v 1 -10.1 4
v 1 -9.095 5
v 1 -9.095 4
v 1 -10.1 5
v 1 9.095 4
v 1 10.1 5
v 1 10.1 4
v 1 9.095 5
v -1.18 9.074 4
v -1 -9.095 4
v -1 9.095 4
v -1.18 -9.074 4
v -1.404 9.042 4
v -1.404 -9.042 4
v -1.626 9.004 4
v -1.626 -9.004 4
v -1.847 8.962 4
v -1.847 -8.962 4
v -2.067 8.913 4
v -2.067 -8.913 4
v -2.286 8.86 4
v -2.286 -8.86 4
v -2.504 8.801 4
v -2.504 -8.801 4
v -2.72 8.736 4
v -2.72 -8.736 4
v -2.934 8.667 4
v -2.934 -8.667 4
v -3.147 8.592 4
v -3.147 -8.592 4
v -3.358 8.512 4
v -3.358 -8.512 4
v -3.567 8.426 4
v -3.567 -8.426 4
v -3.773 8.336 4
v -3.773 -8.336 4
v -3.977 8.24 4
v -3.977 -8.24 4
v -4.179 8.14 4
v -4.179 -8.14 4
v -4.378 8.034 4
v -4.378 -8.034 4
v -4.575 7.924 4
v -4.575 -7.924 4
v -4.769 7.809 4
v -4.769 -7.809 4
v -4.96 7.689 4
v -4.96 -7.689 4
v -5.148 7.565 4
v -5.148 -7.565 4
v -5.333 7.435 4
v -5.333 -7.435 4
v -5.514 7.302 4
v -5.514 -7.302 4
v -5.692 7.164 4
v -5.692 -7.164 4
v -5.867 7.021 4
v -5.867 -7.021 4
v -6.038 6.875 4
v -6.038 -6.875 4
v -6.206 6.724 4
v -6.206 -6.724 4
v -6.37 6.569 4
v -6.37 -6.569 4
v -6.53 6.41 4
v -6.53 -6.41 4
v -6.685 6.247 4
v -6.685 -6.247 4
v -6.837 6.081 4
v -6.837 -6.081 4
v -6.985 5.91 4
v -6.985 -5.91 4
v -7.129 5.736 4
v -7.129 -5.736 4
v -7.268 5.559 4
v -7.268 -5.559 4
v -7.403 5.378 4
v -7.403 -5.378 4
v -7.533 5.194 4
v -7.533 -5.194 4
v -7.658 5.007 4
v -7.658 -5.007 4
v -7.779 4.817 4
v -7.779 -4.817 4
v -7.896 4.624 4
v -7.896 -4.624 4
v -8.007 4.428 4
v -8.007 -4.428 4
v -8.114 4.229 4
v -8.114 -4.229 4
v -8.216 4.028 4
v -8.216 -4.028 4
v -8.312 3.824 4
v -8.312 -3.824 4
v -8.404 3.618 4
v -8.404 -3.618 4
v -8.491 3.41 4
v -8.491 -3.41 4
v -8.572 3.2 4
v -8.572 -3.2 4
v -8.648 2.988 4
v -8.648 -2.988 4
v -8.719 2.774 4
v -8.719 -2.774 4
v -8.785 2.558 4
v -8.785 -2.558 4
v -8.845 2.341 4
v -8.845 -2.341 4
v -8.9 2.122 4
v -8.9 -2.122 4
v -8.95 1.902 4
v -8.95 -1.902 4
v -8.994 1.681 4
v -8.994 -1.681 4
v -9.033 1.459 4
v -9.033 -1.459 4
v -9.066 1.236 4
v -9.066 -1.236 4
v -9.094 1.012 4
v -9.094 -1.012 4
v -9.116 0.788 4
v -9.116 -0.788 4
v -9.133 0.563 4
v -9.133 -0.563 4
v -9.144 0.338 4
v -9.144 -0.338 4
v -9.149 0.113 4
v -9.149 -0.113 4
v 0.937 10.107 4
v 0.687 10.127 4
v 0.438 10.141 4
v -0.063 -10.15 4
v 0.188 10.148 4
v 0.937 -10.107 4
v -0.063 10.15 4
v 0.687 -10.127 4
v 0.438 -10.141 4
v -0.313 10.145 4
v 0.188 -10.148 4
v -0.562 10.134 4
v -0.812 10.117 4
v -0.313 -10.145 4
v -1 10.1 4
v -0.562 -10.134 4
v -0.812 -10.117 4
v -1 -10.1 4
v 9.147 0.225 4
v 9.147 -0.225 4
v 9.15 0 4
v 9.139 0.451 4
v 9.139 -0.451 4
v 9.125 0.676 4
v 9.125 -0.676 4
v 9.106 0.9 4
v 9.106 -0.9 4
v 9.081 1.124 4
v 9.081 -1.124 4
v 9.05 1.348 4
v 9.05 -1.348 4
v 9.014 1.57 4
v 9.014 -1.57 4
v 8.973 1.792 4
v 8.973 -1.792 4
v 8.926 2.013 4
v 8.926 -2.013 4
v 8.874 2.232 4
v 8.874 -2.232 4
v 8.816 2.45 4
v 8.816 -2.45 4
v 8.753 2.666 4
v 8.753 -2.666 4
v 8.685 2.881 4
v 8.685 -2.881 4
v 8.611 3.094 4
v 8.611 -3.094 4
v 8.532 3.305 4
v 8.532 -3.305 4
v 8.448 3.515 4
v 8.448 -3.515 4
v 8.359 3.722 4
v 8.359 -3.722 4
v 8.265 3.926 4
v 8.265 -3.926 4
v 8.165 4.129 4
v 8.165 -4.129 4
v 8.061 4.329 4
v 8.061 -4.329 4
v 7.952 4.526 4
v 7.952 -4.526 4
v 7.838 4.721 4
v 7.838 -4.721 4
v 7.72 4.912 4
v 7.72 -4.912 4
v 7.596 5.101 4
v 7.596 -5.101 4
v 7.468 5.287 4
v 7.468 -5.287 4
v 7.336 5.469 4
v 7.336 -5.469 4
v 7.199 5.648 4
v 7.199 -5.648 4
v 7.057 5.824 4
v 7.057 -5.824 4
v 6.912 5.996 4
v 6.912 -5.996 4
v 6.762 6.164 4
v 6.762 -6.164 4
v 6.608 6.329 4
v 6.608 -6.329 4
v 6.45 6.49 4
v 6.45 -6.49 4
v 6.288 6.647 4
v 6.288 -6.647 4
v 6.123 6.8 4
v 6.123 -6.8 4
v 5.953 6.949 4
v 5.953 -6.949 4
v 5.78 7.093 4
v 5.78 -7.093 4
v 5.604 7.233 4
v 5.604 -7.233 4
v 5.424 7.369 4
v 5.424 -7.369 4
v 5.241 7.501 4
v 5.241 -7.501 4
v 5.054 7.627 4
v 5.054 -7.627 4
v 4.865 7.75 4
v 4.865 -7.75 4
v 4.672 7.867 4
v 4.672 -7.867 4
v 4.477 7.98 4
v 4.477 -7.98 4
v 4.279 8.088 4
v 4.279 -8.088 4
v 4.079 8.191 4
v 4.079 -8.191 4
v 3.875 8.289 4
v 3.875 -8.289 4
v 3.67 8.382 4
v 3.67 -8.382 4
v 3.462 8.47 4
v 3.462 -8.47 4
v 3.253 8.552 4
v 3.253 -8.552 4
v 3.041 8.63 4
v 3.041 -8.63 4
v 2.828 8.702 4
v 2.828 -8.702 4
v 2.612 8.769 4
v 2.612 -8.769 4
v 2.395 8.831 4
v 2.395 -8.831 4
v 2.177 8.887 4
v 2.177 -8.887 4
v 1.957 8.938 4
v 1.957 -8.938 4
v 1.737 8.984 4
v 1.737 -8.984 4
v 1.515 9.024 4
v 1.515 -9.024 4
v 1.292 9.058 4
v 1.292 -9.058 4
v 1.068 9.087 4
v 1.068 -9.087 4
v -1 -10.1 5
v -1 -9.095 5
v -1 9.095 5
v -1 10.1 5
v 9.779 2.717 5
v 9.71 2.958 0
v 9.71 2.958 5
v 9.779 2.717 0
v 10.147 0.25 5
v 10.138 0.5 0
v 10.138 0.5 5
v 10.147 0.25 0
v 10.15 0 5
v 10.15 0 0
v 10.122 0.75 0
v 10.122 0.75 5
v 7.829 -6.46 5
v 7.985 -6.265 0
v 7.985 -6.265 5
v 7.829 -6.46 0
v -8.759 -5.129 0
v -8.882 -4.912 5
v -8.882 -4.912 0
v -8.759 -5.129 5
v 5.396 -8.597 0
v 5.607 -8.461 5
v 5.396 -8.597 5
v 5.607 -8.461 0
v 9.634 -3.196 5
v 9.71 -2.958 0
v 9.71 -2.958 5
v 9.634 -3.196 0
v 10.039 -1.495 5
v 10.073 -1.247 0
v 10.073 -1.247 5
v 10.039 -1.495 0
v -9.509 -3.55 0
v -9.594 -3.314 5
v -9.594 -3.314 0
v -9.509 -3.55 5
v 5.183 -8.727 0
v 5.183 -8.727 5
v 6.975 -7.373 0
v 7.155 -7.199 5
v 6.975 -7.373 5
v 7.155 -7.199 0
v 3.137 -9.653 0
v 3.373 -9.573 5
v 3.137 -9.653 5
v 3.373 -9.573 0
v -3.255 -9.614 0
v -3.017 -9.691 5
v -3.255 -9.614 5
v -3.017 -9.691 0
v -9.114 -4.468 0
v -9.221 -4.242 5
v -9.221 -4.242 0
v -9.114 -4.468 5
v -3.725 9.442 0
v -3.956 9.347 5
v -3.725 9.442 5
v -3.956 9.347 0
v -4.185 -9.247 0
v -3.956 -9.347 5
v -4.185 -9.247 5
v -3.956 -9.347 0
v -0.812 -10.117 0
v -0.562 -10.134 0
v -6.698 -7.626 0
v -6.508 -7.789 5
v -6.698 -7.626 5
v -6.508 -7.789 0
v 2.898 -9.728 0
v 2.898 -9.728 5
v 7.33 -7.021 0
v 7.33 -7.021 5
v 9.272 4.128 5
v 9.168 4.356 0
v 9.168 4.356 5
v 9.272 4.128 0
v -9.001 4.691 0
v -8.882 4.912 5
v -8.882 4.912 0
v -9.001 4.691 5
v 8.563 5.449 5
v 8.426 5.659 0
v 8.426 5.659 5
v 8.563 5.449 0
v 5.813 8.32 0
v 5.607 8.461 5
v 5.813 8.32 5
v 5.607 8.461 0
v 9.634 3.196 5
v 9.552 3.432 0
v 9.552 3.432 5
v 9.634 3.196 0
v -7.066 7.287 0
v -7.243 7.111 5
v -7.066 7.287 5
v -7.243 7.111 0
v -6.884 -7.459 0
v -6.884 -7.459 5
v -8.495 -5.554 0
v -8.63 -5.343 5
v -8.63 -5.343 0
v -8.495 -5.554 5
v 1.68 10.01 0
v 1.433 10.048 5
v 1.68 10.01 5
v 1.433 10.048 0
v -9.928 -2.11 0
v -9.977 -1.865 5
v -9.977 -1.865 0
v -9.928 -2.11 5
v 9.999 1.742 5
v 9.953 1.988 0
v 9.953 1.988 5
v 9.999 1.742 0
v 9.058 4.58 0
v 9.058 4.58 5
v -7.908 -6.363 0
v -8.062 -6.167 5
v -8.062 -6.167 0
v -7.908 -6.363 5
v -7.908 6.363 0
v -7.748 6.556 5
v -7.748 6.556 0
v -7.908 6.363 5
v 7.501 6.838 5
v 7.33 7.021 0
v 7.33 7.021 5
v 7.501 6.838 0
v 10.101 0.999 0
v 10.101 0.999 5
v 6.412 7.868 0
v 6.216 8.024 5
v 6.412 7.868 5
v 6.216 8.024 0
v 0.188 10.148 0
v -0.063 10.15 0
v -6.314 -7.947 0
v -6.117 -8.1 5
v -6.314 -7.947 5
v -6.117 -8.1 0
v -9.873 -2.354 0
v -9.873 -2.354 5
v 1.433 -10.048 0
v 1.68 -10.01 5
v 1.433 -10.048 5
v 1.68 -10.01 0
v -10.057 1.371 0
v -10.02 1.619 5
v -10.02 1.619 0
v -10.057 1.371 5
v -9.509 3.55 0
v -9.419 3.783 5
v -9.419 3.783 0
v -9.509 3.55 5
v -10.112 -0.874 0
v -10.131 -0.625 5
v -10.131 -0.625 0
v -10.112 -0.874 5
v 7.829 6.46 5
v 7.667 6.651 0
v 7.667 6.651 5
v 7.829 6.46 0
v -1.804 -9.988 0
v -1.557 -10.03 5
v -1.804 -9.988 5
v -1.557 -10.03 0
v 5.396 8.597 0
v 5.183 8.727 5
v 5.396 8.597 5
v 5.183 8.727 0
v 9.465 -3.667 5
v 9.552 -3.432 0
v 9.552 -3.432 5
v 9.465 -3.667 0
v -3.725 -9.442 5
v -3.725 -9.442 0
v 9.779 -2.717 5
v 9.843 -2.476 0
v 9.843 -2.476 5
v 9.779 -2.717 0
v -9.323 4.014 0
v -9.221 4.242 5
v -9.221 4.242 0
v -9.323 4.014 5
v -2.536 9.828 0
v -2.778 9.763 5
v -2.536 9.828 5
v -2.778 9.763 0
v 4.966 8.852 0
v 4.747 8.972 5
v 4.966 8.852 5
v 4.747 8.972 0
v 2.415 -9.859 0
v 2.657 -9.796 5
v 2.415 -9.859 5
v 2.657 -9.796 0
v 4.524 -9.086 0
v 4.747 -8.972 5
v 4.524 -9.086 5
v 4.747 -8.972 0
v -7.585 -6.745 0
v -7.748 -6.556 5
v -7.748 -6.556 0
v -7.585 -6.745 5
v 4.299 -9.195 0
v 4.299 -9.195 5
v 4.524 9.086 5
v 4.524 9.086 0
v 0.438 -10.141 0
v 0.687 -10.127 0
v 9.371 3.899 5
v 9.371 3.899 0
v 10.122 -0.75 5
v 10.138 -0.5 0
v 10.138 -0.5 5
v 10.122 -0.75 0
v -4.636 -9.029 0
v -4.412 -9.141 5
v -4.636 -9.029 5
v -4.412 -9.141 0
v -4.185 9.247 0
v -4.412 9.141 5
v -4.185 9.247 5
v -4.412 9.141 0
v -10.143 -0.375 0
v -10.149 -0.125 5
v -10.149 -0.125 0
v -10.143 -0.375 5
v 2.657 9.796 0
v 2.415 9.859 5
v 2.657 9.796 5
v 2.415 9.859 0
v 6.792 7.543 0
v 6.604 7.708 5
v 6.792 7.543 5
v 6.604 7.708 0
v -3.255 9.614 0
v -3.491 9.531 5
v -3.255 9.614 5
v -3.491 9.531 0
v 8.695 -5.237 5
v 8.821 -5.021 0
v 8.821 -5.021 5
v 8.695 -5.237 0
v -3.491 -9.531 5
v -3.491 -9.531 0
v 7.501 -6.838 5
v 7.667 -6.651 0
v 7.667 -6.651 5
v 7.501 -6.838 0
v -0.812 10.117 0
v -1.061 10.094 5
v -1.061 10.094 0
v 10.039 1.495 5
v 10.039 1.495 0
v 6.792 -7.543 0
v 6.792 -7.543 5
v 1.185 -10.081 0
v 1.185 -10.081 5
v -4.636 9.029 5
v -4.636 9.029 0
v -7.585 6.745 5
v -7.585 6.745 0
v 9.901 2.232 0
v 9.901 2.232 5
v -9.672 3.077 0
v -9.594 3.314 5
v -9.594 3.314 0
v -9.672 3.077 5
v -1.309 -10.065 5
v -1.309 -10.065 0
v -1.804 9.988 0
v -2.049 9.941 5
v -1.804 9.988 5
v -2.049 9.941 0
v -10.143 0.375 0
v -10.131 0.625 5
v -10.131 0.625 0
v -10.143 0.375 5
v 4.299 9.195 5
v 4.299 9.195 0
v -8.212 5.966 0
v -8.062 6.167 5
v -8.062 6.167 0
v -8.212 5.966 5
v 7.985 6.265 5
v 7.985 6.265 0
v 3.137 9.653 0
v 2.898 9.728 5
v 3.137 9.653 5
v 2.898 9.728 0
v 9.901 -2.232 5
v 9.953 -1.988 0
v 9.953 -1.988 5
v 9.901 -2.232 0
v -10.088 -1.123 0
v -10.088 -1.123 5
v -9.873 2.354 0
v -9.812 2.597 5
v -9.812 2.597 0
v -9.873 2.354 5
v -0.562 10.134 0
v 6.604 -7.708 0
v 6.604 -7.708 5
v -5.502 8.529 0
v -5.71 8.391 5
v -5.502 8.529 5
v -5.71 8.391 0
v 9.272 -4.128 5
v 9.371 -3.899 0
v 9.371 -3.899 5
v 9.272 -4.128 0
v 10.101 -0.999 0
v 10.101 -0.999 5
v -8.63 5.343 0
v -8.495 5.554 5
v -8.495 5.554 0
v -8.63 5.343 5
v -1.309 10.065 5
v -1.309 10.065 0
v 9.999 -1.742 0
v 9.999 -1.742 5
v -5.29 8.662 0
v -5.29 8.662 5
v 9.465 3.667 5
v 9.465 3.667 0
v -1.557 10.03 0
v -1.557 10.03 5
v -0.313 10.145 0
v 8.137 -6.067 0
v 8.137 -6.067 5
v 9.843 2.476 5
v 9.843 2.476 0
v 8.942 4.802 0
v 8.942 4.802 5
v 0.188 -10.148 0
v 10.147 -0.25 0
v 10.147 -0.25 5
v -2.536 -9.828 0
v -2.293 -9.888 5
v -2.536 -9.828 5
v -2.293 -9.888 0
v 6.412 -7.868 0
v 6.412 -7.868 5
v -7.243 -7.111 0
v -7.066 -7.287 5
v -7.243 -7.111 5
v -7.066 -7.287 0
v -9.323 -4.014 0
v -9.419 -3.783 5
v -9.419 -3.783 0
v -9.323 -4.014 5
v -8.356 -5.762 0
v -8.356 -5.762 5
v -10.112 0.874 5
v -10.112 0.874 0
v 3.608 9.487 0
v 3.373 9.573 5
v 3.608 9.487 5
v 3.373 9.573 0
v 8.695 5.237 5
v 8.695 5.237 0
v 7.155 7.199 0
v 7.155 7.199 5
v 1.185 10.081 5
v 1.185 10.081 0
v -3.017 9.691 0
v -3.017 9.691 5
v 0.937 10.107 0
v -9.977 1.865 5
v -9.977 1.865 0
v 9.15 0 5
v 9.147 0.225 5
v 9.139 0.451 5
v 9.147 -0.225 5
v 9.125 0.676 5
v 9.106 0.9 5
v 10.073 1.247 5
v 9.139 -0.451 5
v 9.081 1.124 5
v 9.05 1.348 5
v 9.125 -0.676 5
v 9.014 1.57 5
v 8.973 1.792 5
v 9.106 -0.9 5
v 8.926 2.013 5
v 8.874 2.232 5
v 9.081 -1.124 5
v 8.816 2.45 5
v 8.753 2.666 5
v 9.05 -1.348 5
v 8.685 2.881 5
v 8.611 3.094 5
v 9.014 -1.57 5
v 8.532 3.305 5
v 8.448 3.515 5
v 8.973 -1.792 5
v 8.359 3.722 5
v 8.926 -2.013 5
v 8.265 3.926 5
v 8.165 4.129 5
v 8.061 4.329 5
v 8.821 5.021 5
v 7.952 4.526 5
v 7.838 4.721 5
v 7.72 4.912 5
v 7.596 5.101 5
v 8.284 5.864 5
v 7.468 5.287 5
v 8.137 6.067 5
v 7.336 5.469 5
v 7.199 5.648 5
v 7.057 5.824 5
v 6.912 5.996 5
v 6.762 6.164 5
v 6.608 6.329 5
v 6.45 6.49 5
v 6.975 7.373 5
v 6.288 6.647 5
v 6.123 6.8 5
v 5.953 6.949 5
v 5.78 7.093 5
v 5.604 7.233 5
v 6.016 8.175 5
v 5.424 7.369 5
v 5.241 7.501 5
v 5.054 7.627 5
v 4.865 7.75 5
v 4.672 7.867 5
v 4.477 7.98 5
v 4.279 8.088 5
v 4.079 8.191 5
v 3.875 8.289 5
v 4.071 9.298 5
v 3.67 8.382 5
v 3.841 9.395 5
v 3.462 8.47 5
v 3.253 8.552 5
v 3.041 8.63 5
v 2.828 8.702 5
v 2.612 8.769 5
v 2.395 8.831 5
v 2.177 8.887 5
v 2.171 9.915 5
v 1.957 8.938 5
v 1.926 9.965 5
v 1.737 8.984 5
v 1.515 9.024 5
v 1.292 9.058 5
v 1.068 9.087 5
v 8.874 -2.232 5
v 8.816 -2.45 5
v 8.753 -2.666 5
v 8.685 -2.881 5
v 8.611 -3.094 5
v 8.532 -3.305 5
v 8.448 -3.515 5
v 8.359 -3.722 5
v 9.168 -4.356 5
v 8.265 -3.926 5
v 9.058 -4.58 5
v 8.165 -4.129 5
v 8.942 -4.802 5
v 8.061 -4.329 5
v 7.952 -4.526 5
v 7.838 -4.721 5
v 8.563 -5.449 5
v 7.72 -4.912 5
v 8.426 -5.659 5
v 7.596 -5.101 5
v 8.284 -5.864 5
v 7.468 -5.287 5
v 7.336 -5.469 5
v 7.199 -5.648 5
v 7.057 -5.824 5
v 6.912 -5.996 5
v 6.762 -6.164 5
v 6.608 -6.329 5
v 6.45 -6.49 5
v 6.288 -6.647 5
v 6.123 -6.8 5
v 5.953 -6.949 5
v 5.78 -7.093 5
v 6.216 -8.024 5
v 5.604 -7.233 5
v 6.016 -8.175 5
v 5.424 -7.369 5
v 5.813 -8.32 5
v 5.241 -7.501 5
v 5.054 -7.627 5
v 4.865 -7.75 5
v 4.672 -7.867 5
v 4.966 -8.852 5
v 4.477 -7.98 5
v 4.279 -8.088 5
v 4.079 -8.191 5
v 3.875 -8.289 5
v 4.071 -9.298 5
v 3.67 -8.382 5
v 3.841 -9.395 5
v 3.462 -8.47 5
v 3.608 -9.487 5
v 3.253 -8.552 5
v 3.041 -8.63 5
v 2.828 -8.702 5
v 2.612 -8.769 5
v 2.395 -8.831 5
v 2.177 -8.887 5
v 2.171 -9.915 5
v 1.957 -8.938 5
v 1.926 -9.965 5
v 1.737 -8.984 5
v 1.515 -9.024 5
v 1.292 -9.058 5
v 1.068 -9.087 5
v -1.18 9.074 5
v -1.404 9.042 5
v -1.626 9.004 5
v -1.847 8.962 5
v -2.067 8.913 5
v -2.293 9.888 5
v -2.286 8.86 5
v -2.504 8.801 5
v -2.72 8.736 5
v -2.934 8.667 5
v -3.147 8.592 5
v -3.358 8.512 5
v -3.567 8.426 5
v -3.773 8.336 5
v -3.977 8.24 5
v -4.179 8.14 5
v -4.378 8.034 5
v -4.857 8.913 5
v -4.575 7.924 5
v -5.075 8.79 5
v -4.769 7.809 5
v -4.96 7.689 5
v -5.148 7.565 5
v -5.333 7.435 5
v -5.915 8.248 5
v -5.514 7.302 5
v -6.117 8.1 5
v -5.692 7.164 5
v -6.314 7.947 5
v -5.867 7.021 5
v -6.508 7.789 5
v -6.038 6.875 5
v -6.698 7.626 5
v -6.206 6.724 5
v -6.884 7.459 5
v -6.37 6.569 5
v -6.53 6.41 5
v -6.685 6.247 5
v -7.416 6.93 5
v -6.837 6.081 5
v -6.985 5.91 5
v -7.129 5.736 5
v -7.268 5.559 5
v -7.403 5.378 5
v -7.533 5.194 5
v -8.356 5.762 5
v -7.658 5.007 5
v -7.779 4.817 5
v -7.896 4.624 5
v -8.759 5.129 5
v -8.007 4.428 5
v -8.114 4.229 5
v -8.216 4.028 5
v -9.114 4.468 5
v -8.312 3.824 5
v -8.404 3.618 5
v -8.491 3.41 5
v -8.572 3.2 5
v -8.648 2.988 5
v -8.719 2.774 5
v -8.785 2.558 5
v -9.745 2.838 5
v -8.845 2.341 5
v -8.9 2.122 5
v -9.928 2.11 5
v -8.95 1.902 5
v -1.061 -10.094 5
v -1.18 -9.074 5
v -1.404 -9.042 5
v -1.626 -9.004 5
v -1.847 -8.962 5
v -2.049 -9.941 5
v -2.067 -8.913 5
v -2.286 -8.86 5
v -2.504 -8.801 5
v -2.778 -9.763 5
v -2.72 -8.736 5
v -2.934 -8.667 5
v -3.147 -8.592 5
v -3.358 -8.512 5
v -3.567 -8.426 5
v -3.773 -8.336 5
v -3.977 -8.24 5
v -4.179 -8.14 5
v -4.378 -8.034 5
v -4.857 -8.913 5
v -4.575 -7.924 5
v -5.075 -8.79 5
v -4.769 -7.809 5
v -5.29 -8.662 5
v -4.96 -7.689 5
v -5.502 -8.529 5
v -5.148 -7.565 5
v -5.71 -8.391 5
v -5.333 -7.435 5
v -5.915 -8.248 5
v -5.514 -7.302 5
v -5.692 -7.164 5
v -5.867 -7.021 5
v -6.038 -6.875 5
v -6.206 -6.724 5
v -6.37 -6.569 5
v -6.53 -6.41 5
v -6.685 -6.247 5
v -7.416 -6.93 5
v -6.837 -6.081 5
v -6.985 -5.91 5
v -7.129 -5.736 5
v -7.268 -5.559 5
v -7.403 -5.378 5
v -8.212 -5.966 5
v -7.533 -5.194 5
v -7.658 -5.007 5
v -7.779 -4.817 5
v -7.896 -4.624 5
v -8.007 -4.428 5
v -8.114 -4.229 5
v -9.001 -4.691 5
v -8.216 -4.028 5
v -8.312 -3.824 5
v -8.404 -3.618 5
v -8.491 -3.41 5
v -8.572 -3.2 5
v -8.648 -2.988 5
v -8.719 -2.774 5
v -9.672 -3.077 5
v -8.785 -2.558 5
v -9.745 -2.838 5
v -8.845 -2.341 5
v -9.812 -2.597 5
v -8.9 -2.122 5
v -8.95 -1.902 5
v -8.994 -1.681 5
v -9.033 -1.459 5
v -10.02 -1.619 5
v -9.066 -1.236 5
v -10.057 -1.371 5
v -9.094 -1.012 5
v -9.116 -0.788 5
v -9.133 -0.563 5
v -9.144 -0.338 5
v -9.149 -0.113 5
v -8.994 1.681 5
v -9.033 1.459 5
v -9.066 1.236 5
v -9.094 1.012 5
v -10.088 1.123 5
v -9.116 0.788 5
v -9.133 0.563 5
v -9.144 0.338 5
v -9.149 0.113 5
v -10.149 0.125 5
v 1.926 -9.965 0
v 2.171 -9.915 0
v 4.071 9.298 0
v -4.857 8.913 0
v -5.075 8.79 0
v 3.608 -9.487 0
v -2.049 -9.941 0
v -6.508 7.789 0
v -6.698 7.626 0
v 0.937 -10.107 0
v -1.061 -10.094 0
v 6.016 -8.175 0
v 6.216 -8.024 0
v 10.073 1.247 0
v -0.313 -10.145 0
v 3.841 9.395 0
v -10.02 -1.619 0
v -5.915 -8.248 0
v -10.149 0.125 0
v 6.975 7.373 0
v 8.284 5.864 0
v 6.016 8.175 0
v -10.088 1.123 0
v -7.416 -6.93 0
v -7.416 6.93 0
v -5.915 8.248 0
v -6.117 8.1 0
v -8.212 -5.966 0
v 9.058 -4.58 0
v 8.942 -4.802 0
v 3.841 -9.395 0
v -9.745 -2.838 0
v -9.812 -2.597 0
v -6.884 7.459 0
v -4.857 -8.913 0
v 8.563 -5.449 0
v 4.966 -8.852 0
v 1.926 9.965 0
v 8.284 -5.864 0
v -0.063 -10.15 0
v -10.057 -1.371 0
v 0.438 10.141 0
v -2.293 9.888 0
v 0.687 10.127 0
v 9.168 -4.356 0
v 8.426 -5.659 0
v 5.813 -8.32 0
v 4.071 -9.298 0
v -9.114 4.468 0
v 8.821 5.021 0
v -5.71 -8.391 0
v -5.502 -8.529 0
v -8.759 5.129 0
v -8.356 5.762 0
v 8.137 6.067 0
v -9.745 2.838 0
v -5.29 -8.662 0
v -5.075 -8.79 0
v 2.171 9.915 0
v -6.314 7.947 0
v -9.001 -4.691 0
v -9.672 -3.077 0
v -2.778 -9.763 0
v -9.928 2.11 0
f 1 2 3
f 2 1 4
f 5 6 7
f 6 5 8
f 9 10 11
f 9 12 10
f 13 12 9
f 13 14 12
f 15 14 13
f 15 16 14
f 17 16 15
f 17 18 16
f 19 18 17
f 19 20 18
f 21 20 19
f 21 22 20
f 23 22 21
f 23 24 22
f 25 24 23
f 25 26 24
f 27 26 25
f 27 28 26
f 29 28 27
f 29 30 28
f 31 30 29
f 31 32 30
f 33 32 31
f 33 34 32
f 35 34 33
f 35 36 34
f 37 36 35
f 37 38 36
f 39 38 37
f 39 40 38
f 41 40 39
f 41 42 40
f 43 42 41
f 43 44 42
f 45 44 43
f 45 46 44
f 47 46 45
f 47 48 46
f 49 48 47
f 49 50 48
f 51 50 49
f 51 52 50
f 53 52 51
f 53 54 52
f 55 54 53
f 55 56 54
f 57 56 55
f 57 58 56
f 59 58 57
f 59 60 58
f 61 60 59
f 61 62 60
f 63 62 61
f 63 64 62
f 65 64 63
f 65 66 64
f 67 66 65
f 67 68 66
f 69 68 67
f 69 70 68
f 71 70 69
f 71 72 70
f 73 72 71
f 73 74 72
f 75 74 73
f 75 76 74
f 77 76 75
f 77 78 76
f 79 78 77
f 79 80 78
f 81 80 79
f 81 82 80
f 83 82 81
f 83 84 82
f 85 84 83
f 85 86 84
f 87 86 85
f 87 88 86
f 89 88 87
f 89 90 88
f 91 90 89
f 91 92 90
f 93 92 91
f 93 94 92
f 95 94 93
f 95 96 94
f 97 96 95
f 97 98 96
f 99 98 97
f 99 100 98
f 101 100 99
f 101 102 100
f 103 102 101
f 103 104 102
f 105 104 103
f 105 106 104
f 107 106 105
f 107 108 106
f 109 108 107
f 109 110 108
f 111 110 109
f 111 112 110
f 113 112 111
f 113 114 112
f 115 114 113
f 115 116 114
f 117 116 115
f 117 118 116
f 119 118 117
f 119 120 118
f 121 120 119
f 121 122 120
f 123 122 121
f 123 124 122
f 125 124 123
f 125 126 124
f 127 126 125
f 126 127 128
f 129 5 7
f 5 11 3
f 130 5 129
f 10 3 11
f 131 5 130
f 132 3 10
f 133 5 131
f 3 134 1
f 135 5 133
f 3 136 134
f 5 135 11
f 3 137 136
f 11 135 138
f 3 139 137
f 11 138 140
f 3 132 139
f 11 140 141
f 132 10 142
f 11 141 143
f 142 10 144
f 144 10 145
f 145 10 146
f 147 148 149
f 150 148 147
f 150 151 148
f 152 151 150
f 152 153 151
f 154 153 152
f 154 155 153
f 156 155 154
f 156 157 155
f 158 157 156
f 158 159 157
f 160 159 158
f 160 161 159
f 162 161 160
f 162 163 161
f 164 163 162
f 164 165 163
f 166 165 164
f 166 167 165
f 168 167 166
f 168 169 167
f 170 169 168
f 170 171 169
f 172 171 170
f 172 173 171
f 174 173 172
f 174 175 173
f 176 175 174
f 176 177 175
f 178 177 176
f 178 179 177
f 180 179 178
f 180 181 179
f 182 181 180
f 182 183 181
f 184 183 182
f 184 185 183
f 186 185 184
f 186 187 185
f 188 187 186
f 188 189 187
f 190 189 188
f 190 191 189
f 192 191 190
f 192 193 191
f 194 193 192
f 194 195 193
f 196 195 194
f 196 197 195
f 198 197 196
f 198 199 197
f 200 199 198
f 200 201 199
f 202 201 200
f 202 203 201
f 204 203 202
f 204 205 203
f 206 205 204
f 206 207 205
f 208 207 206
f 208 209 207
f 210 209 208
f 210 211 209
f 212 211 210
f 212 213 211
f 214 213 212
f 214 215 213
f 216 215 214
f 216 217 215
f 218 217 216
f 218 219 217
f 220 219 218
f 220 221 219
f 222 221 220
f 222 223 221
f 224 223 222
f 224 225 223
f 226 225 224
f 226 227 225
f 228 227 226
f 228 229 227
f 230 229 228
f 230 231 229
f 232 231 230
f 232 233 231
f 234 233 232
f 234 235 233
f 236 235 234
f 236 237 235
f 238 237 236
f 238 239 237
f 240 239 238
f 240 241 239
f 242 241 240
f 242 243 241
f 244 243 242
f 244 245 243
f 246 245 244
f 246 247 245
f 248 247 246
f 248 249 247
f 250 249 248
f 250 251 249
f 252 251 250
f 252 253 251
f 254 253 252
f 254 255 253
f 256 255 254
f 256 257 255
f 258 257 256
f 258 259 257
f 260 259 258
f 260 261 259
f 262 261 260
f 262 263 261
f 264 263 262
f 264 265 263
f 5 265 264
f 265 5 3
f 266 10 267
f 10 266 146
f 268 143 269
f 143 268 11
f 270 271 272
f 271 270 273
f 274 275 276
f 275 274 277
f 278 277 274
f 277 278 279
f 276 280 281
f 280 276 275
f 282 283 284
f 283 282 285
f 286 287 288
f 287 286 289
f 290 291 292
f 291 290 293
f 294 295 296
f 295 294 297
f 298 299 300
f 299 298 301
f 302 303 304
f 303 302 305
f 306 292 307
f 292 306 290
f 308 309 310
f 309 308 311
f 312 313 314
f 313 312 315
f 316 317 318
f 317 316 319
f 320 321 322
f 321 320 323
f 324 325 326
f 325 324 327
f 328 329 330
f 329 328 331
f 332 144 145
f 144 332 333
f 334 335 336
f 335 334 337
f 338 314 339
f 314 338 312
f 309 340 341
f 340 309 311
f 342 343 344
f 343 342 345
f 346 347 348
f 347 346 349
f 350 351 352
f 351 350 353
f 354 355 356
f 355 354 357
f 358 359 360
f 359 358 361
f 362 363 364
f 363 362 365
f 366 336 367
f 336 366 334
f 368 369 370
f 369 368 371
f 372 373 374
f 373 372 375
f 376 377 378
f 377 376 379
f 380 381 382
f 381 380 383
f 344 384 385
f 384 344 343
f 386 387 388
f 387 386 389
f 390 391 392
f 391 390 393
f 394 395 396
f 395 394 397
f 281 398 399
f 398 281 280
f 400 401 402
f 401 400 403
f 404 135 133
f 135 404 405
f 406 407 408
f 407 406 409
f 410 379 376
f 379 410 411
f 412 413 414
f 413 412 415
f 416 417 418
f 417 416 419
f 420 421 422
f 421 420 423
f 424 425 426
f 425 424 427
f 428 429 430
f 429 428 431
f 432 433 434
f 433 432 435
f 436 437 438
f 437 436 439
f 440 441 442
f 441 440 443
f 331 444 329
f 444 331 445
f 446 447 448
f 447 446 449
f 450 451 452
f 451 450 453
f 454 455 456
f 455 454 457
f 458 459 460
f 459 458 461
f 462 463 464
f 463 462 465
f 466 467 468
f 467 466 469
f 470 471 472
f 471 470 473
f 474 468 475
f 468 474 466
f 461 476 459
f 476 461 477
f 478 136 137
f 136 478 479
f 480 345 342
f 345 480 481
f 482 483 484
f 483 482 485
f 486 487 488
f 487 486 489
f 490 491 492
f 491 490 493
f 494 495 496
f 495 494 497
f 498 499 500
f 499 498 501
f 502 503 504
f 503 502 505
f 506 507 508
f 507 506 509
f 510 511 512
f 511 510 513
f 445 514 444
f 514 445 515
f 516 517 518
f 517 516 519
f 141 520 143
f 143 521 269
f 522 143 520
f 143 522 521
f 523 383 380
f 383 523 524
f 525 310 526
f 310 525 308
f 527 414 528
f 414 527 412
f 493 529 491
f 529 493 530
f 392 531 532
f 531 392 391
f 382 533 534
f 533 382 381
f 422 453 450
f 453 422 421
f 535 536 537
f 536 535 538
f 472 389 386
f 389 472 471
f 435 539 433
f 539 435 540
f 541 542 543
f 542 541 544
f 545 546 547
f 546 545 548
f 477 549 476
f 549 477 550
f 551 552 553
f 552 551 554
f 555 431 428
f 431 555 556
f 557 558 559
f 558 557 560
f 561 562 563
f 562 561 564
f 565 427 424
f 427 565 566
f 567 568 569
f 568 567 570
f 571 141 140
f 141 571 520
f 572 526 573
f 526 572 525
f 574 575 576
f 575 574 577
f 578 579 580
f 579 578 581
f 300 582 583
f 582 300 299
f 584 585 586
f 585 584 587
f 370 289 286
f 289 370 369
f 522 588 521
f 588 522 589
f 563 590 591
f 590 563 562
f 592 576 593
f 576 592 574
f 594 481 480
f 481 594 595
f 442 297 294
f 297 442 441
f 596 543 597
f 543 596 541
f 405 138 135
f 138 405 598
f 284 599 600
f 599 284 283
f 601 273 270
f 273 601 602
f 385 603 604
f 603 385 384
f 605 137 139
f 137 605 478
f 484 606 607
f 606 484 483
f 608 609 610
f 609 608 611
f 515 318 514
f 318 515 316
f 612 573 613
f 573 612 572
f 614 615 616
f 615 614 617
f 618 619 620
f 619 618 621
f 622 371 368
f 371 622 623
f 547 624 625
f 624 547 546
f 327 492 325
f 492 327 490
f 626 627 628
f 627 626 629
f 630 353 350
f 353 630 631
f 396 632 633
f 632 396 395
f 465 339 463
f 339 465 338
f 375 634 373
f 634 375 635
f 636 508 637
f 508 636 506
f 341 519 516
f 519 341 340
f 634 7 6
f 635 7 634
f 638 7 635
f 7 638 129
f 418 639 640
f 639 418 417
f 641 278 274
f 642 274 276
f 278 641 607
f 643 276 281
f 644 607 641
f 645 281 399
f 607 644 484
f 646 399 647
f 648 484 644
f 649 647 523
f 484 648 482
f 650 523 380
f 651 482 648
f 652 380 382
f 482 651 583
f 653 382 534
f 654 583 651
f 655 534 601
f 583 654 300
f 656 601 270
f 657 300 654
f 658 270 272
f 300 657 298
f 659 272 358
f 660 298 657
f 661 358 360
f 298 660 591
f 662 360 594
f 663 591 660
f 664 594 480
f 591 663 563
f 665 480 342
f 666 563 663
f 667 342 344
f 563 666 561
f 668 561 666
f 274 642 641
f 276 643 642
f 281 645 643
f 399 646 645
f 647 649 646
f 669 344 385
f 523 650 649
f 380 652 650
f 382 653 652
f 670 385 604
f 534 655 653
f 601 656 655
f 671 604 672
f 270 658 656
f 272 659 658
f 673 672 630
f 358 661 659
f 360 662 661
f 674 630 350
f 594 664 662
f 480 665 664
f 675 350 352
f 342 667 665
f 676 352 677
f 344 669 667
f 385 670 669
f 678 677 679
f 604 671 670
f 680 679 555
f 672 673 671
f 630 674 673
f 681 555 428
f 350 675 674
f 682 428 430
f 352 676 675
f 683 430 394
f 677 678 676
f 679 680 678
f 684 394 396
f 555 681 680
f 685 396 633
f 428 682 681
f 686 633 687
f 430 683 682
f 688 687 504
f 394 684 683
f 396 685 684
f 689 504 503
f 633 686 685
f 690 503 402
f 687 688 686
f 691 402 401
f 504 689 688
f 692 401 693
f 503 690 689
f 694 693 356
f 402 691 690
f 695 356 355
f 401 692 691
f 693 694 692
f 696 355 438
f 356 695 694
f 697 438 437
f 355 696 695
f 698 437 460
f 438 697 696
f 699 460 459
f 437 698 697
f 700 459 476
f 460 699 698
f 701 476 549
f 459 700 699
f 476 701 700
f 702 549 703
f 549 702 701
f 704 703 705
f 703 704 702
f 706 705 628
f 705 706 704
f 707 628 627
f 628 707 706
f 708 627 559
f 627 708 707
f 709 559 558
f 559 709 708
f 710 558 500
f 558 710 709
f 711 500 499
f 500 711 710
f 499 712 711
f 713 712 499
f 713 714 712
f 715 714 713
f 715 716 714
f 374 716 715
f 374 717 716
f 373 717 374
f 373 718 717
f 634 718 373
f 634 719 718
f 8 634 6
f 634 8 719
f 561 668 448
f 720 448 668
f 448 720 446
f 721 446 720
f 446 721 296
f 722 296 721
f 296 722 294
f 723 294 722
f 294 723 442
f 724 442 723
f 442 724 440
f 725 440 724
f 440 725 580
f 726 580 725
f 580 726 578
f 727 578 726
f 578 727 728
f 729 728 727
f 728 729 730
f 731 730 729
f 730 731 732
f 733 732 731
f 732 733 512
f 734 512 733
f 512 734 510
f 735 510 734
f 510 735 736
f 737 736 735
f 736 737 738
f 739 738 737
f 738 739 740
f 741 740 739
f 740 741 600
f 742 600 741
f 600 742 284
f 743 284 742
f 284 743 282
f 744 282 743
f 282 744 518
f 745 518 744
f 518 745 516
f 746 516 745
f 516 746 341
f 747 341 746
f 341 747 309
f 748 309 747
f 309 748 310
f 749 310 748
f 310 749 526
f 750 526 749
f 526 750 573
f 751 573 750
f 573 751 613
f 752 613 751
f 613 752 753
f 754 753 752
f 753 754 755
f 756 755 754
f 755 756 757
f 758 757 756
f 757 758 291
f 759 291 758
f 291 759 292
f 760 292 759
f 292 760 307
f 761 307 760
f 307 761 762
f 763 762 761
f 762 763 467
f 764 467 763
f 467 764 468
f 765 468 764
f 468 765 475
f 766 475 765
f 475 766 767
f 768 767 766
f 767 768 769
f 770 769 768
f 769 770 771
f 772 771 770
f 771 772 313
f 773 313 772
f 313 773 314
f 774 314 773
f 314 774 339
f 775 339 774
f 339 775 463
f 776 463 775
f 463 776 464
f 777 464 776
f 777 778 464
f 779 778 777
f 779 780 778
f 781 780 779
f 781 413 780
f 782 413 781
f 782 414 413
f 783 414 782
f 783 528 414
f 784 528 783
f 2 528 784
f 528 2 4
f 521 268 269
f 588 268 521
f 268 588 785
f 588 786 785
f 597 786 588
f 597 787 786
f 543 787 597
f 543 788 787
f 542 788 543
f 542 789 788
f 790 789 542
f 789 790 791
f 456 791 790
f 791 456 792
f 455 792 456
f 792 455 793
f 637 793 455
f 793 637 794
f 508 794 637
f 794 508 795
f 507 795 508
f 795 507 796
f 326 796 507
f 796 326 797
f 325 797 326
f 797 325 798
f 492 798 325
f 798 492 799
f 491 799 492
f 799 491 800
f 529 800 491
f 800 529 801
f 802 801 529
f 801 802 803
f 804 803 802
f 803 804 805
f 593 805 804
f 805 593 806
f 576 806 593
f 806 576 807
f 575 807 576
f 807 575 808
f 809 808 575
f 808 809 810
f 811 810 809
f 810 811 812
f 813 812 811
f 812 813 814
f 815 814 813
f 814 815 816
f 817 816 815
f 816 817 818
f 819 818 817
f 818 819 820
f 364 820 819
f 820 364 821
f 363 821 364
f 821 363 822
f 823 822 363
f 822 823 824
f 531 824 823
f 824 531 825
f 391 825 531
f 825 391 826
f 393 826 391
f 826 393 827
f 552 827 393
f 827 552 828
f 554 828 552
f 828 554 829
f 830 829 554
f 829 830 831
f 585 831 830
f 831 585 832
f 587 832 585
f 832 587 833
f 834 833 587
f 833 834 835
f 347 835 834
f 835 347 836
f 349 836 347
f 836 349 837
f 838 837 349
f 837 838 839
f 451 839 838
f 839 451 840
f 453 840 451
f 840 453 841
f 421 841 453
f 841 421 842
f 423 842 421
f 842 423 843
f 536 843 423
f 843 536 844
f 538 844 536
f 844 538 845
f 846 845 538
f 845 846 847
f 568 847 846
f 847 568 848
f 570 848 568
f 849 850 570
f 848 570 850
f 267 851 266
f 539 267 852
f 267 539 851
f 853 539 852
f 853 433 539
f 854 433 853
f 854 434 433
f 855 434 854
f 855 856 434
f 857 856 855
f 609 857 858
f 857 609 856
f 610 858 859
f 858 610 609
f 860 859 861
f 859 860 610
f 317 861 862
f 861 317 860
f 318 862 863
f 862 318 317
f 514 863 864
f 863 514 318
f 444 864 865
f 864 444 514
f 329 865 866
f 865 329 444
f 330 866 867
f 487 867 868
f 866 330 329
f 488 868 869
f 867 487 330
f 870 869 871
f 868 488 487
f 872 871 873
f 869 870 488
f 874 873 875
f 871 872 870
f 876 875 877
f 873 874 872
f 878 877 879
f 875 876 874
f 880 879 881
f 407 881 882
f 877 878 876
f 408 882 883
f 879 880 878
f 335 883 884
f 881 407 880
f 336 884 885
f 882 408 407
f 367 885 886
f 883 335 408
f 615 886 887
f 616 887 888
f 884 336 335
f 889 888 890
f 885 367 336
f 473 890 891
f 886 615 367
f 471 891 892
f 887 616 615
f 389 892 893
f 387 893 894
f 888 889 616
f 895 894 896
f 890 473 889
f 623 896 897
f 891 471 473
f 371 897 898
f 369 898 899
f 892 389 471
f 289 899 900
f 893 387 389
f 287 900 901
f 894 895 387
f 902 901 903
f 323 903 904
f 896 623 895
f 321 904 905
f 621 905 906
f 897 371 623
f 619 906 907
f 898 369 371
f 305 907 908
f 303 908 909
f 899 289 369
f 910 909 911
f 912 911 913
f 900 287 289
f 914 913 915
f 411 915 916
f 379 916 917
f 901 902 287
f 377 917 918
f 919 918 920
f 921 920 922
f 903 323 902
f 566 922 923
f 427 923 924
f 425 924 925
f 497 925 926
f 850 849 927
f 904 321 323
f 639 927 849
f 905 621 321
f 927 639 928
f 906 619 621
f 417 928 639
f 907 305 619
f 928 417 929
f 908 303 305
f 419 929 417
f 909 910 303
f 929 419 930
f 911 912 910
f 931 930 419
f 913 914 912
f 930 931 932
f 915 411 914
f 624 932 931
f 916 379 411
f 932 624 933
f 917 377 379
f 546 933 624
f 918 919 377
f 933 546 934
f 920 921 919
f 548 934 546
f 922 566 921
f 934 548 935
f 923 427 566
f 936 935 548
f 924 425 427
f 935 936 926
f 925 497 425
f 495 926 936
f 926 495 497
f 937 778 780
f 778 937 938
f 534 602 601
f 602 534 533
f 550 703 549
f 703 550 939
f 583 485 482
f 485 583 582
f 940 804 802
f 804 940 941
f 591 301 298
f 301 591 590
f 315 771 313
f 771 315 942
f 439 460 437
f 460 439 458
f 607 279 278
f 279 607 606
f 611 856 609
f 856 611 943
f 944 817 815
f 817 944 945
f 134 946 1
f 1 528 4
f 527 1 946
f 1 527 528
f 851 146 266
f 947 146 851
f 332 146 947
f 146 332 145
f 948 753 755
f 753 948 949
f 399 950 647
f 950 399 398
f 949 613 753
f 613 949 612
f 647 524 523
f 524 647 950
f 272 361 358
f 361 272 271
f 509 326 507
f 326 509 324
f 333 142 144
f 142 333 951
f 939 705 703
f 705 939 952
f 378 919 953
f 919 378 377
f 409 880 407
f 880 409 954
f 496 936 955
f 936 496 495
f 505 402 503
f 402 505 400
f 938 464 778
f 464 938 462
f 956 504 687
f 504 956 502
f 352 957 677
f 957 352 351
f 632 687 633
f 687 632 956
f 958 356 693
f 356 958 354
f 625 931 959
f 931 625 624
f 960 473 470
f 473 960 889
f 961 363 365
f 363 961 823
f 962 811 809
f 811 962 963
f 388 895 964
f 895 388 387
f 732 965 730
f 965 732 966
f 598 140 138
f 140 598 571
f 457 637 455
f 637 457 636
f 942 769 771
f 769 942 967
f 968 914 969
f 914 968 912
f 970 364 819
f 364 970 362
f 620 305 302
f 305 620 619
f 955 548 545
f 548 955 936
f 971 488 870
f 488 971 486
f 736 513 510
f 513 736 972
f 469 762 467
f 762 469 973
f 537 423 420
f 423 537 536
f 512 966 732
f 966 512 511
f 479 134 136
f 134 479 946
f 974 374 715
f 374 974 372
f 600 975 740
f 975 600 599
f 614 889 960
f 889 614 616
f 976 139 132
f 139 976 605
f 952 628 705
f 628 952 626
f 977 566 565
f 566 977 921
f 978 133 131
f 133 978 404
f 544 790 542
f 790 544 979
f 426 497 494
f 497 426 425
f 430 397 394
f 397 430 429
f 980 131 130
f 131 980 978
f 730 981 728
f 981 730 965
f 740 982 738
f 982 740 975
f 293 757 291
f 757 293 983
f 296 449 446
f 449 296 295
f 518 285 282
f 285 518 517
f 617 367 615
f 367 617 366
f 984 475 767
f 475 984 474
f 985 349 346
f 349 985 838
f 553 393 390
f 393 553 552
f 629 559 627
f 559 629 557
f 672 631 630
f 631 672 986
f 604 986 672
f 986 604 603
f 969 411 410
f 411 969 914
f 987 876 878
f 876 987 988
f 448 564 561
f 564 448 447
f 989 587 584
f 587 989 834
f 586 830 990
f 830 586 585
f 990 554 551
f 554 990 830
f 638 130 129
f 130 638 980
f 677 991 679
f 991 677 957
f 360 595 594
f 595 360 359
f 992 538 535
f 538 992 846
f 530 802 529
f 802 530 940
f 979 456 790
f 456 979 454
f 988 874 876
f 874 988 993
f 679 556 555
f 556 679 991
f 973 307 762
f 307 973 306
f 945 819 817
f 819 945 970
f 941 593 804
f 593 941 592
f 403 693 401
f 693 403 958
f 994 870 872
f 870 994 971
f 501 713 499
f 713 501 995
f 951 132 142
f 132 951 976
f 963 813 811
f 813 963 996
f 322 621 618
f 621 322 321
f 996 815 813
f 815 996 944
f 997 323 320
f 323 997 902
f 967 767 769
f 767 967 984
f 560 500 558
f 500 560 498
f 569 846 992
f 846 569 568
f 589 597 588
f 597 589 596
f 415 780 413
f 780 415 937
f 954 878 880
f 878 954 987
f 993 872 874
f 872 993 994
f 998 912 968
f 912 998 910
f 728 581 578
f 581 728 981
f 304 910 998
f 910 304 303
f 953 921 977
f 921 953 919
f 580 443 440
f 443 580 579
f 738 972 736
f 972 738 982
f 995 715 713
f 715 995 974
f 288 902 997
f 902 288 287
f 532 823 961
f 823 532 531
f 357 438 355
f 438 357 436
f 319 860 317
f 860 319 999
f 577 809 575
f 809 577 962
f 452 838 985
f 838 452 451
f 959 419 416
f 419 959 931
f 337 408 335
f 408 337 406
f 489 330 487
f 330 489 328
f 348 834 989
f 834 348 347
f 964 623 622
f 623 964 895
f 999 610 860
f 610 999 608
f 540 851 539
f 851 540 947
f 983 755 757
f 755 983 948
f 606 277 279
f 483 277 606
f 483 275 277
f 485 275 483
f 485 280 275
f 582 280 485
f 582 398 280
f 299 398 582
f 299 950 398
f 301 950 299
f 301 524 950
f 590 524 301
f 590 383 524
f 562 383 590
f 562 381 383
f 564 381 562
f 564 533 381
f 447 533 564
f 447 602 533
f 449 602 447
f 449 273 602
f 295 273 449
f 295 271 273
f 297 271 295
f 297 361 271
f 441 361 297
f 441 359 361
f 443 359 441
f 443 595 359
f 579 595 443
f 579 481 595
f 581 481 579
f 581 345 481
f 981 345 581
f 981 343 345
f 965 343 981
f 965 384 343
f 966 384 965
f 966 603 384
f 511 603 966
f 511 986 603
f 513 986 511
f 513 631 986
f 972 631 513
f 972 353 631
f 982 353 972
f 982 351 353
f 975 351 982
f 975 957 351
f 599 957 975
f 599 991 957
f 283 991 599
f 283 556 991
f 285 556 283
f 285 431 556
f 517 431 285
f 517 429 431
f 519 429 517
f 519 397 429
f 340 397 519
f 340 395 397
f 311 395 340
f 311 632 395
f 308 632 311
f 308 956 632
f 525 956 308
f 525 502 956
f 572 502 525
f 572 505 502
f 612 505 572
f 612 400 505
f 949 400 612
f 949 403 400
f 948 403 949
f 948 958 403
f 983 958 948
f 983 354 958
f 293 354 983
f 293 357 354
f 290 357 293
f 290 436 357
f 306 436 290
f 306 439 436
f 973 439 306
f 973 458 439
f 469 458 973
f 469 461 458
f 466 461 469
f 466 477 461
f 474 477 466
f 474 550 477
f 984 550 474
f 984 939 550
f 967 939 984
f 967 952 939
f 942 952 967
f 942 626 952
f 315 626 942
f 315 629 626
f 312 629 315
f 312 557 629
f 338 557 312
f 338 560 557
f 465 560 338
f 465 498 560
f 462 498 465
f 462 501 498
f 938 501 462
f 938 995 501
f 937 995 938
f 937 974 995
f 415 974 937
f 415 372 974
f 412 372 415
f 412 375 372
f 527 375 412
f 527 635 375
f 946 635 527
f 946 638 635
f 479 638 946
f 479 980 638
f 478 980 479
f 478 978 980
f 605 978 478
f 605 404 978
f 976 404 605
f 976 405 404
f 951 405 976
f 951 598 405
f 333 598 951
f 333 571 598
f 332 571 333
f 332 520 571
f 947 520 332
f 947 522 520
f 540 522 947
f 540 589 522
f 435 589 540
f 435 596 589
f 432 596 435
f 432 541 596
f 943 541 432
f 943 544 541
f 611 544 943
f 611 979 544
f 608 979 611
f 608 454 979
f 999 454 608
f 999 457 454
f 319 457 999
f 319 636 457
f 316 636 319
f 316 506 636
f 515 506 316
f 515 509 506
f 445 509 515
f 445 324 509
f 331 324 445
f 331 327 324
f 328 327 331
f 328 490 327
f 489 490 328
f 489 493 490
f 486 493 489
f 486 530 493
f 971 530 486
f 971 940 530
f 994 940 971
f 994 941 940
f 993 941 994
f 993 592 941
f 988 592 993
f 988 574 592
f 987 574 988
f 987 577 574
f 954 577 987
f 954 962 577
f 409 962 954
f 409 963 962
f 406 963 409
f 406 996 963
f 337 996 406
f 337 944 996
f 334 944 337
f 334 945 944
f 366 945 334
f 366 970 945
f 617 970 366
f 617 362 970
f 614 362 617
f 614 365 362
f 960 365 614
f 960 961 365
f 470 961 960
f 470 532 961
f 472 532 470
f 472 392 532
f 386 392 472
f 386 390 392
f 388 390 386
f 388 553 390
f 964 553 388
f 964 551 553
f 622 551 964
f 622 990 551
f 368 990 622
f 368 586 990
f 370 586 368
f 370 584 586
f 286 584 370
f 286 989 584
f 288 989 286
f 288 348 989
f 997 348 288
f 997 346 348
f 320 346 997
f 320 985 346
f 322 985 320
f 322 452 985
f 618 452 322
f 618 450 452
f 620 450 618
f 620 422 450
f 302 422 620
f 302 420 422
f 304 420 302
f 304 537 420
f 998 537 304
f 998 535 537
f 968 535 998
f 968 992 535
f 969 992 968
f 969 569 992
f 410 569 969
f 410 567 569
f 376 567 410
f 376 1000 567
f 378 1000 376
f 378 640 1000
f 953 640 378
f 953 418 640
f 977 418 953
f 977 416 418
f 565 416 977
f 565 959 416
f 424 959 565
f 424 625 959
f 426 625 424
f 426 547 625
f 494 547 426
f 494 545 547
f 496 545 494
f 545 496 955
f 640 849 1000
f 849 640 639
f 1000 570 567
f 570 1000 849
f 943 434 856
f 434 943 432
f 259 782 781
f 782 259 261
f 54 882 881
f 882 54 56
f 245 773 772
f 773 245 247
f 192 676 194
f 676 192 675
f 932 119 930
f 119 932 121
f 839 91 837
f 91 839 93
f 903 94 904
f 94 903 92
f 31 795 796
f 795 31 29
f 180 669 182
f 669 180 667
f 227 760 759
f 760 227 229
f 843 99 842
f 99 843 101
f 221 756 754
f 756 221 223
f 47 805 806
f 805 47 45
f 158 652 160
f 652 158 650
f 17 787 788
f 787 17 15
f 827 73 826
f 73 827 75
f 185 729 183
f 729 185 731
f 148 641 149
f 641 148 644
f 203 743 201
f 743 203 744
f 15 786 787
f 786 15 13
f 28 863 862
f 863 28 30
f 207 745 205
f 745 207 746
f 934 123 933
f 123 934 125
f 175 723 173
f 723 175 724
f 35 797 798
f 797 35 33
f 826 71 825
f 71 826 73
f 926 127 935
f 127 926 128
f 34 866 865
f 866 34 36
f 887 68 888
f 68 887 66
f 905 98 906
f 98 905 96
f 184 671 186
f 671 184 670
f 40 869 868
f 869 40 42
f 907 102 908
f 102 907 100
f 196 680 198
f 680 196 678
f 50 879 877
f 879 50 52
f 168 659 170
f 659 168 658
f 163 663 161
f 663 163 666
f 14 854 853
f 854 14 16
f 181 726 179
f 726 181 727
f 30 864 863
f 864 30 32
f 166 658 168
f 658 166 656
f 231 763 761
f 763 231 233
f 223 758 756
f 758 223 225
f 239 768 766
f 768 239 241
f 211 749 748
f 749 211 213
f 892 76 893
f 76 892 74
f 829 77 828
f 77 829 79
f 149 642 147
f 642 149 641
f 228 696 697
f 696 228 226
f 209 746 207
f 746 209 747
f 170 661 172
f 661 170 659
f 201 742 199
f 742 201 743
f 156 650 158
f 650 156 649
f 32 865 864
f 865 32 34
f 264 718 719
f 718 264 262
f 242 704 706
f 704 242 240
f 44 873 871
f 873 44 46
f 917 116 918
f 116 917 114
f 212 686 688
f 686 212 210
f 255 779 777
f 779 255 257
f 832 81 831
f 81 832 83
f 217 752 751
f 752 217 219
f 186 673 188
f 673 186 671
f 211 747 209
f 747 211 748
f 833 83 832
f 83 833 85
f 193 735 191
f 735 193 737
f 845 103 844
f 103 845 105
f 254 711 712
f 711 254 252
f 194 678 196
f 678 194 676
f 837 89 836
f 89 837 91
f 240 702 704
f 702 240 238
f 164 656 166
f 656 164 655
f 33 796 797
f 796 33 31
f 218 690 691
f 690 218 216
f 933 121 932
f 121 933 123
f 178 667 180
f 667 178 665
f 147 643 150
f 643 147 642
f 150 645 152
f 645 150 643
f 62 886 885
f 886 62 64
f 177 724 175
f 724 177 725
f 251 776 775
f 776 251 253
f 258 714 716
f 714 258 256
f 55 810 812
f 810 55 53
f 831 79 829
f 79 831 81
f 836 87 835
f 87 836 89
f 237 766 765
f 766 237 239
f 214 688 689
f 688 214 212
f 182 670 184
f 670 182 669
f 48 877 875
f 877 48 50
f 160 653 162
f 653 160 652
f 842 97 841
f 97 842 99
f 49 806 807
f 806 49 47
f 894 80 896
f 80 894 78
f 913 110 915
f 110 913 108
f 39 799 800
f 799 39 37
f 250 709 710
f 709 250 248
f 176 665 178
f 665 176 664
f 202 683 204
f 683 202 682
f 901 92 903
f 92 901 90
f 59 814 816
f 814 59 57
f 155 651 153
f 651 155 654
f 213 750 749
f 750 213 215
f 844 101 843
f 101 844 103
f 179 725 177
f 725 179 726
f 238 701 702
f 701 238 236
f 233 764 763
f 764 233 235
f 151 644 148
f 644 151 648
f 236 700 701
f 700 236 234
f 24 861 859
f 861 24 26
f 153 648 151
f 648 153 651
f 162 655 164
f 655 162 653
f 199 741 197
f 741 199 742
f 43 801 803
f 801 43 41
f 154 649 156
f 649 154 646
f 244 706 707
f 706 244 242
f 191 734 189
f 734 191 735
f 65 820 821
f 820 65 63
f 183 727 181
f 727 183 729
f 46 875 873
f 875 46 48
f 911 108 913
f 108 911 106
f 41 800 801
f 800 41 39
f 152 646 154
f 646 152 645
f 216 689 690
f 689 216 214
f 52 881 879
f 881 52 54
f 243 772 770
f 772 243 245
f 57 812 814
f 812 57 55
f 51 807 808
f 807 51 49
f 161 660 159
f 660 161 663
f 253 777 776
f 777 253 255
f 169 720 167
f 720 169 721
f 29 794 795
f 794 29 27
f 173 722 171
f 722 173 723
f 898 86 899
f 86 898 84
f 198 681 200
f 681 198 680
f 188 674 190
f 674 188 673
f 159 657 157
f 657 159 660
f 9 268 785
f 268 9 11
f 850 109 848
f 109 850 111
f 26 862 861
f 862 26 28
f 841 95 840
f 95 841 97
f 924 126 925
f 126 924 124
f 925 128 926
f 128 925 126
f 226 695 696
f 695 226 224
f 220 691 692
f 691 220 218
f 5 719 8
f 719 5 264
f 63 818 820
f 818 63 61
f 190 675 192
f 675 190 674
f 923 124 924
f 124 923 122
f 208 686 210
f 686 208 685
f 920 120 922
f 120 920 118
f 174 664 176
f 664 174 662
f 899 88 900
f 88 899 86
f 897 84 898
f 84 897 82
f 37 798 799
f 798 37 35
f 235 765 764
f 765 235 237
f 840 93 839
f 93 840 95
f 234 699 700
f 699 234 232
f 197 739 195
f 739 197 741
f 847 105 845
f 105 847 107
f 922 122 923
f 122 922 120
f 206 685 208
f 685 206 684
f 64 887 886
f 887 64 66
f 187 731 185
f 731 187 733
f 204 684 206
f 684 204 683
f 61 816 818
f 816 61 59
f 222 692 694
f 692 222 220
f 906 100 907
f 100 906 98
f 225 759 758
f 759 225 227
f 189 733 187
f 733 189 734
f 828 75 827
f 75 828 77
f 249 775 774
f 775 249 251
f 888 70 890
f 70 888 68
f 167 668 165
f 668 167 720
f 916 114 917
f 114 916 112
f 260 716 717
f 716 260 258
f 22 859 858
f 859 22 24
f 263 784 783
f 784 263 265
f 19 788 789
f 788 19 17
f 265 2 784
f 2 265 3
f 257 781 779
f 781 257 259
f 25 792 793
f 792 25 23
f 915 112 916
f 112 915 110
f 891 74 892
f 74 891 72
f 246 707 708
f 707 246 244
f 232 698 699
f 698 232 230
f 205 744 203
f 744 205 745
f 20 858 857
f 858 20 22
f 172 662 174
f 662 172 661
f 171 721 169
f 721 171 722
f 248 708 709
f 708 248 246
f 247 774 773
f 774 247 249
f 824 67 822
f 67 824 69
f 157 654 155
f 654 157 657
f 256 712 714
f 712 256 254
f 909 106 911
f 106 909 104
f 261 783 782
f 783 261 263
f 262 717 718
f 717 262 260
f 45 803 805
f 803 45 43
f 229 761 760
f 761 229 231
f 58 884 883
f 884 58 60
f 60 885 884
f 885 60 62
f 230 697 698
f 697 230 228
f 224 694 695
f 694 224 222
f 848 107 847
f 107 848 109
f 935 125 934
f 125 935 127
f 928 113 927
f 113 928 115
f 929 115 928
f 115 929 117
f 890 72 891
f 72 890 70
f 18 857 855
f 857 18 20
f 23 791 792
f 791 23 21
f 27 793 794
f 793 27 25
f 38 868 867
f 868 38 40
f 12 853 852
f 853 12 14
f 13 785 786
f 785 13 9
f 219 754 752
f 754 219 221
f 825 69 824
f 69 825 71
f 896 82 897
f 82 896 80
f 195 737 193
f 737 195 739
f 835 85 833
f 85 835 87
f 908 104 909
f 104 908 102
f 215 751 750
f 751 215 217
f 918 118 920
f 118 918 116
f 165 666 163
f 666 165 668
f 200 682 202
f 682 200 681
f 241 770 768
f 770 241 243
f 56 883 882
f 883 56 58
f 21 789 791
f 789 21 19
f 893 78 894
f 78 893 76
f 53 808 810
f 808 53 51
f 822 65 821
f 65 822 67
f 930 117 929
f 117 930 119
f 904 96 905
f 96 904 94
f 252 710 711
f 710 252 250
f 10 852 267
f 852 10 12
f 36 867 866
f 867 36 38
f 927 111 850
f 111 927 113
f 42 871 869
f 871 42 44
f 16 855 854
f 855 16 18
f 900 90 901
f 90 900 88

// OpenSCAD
H = 5;
R = 10.15;

// linear_extrude(H)
//   translate([0, 0, 0 ])
//     text("9",size=14,font="Hobbiton Brushhand",halign="center",valign="center");

difference() {
  cylinder(r=R, h=H, $fn=255);

  translate([0, 0, H - 1])
    cylinder(r=R-1, h=H, $fn=255);
  

  for ( i = [0 : 360 / 2 : 360] ){
    rotate([0, 0, i])
      translate([0, 5, H])
          cube(size = [2, 20, 2], center = true);
  }
}
